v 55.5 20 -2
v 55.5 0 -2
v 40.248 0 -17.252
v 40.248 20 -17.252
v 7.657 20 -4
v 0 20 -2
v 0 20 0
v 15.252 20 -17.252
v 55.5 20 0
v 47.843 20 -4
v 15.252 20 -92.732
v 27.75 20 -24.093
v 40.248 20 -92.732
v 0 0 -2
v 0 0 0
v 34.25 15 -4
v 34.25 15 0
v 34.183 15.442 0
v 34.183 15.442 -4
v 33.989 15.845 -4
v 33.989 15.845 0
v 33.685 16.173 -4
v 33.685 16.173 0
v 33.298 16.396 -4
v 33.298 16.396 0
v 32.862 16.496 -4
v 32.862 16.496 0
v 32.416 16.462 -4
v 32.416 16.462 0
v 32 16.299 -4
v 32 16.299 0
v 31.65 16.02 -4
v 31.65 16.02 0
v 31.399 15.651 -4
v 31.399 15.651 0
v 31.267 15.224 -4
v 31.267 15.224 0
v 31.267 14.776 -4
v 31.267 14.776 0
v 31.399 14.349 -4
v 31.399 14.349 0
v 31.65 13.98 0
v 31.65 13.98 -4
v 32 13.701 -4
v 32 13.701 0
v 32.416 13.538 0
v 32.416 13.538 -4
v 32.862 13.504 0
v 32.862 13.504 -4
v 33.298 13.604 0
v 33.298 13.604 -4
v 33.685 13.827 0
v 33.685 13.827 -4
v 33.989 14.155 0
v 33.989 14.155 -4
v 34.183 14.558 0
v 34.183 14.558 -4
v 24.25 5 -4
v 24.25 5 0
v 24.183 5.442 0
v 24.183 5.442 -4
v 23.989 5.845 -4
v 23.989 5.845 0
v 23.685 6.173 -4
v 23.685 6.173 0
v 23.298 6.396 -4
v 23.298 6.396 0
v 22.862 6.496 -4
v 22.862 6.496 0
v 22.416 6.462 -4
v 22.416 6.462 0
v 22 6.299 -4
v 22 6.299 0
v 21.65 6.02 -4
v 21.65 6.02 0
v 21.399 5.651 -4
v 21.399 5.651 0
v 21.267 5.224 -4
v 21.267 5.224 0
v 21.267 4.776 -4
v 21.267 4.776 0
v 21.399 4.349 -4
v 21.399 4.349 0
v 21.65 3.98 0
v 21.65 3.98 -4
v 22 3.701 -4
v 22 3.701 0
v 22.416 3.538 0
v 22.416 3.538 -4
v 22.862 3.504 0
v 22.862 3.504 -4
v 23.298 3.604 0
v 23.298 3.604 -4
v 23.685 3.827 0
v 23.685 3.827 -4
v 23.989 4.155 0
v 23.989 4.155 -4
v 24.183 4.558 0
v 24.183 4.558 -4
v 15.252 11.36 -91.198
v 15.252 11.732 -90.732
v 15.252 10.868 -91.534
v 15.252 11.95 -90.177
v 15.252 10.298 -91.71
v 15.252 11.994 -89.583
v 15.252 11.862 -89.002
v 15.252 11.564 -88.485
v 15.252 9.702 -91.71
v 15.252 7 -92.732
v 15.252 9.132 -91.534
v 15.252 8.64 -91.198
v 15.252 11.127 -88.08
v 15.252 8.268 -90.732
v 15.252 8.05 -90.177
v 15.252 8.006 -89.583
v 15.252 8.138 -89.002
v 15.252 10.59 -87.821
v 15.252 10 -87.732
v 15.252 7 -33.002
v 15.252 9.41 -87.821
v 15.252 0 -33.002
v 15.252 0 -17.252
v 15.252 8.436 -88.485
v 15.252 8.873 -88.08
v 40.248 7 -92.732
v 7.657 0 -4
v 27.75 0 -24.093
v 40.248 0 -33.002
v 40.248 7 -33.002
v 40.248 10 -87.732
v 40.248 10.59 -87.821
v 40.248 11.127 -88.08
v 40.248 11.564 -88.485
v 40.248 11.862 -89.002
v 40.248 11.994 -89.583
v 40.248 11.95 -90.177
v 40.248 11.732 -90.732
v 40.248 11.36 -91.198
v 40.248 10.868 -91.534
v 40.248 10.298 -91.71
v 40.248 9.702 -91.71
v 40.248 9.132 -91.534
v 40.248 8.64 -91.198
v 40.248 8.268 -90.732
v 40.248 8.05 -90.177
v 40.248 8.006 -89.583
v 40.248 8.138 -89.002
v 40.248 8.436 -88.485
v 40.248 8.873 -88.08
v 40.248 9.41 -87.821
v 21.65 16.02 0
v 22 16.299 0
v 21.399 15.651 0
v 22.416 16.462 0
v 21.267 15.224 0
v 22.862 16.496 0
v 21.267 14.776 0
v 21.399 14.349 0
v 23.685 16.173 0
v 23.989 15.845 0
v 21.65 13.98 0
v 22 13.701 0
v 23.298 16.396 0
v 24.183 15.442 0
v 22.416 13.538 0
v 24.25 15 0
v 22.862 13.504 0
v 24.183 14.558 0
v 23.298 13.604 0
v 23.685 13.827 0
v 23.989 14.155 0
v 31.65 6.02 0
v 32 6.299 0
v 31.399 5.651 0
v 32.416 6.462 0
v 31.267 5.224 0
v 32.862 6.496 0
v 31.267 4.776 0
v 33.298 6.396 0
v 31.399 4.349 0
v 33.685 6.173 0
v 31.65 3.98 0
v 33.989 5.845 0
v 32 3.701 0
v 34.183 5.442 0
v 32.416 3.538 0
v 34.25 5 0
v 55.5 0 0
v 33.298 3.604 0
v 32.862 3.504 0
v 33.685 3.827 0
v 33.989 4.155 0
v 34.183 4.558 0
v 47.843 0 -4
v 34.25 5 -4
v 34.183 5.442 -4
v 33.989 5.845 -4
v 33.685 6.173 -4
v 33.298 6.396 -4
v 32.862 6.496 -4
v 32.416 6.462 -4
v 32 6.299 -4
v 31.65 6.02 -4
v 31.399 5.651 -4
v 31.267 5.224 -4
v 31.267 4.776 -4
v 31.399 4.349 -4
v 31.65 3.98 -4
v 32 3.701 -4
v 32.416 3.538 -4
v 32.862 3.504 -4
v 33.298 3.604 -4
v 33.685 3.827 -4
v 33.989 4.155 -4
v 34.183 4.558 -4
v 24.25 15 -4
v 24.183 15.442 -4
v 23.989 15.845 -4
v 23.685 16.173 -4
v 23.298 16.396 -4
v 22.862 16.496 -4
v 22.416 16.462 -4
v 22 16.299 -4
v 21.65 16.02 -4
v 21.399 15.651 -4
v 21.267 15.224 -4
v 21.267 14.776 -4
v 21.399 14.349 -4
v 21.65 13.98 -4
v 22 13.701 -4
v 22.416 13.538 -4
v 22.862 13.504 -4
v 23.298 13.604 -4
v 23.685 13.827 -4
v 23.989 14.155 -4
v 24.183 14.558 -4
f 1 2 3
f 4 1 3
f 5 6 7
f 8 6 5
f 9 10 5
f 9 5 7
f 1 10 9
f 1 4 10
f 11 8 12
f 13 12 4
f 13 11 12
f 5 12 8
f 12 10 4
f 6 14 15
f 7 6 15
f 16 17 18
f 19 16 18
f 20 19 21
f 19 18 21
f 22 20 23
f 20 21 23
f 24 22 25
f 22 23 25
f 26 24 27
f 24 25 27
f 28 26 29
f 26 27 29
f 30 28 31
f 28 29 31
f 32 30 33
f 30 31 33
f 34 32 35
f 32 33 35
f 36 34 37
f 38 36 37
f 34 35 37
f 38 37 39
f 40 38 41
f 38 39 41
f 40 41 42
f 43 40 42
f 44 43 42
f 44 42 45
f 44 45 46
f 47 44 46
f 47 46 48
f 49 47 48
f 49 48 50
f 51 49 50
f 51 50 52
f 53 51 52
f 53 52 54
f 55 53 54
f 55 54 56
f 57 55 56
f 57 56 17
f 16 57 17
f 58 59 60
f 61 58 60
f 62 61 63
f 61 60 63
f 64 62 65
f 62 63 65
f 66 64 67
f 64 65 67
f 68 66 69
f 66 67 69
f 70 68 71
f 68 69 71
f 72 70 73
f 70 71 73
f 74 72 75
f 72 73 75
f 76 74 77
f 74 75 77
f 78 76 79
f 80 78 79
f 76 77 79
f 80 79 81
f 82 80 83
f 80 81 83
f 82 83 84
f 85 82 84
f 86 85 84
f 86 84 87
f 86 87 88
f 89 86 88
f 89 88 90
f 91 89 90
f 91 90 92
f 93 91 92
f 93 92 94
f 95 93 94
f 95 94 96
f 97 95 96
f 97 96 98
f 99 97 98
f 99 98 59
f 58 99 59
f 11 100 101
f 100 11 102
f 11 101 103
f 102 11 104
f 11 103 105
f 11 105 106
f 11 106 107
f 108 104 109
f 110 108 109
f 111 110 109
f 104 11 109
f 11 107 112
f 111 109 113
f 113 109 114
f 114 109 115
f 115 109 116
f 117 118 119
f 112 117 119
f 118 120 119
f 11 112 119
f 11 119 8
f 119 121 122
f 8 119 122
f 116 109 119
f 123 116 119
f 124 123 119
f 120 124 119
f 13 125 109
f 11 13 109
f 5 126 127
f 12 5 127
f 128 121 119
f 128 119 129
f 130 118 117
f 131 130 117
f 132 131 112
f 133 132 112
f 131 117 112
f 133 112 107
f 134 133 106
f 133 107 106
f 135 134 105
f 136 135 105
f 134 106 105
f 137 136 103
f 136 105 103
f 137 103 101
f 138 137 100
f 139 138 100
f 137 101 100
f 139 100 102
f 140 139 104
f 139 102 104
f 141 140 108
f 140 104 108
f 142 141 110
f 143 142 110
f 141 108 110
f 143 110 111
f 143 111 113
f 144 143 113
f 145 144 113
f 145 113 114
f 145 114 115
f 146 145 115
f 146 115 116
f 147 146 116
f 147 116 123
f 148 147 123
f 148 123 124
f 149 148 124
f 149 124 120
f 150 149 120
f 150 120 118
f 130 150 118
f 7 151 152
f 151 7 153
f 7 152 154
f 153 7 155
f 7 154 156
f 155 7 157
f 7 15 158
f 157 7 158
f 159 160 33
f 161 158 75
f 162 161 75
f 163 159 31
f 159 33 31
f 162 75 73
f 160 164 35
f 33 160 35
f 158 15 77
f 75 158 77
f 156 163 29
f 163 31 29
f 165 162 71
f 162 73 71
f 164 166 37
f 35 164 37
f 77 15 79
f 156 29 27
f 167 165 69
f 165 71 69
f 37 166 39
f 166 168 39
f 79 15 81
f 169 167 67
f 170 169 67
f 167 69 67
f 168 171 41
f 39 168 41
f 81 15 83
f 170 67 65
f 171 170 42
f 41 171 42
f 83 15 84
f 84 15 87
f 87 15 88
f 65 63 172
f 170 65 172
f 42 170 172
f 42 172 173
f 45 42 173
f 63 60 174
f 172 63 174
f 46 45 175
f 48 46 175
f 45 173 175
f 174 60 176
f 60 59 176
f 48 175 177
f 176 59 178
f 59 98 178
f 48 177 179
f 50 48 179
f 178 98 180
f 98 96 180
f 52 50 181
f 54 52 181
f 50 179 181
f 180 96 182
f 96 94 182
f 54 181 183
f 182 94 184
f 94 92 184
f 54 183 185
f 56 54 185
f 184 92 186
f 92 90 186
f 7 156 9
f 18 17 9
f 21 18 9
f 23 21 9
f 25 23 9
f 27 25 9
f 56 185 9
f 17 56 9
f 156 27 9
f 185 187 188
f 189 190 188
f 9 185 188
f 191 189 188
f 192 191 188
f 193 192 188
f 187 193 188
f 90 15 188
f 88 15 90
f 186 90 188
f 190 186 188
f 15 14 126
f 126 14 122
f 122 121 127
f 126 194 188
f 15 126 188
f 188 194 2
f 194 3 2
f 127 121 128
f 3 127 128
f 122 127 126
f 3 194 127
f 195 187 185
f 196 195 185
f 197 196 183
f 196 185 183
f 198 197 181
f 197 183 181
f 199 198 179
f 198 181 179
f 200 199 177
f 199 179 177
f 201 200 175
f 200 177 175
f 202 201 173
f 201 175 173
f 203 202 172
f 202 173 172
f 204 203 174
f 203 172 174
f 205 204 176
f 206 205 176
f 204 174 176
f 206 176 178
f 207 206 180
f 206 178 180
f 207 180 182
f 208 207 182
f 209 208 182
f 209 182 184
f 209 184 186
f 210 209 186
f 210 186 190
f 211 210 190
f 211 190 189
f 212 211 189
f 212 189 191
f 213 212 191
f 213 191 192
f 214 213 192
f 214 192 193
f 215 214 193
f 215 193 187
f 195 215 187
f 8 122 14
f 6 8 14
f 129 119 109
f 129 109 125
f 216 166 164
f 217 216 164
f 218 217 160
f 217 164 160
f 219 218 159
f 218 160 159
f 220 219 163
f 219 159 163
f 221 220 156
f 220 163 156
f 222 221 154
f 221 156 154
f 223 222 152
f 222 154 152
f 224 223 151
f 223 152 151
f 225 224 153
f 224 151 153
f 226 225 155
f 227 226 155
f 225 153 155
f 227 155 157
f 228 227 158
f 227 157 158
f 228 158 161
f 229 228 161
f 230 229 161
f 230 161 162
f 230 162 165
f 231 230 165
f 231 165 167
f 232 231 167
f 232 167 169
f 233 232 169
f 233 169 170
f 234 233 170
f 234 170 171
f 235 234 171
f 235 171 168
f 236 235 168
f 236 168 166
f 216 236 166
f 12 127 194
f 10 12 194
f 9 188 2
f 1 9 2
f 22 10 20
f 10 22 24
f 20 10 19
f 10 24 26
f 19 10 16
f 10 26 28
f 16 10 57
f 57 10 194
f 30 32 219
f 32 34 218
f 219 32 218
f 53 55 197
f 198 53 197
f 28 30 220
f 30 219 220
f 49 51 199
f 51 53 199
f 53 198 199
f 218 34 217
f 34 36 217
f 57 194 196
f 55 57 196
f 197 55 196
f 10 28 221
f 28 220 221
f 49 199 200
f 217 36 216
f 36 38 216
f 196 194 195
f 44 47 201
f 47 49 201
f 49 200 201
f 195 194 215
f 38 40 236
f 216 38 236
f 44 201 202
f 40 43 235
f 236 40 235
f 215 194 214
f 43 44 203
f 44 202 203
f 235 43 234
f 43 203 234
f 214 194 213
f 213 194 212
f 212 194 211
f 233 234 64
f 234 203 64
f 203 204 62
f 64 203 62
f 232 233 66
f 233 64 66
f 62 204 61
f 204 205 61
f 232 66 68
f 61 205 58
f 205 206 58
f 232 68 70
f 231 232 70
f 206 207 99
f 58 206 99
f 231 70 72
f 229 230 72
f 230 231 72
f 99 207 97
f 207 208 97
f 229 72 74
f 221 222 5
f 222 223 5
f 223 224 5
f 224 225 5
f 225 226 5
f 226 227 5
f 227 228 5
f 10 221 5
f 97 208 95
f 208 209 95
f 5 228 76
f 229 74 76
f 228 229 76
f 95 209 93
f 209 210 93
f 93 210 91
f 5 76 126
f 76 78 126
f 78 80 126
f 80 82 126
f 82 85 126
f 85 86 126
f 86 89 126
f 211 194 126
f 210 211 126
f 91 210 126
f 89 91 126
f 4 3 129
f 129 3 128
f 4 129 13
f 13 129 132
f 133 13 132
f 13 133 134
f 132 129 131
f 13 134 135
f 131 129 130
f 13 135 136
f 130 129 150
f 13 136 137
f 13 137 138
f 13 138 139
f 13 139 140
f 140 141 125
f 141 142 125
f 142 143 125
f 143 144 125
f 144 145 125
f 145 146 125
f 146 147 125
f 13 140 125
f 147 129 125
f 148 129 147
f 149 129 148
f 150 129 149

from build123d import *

# Parameters (mm, degrees)
EXTRUDE_1_DEPTH     = 20
SKETCH_2_R          = 1.5
CUT_EXTRUDE_1_DEPTH = 5
SKETCH_4_W          = 24.99770673
SKETCH_4_H          = 59.73
CUT_EXTRUDE_3_DEPTH = 7
SKETCH_8_R          = 2
CUT_EXTRUDE_5_DEPTH = 41.24770673


with BuildPart() as part:
    # 스케치1 → 보스-돌출1 (new body)
    with BuildSketch(Plane(origin=(0, 0, 0), x_dir=(1, 0, 0), z_dir=(0, 1, 0))):
        Polygon((40.24770673, 92.73229327), (15.25229327, 92.73229327), (15.25229327, 17.25229327), (0, 2), (0, 0), (55.5, 0), (55.5, 2), (40.24770673, 17.25229327), align=None)
        Polygon((27.75, 24.093145751), (47.843145751, 4), (7.656854249, 4), align=None, mode=Mode.SUBTRACT)
    extrude(amount=EXTRUDE_1_DEPTH)

    # 스케치2 → 컷-돌출1 (cut)
    with BuildSketch(Plane.XY):
        with Locations((22.75, 15)):
            Circle(SKETCH_2_R)
        with Locations((32.75, 15)):
            Circle(SKETCH_2_R)
        with Locations((32.75, 5)):
            Circle(SKETCH_2_R)
        with Locations((22.75, 5)):
            Circle(SKETCH_2_R)
    extrude(amount=-CUT_EXTRUDE_1_DEPTH, mode=Mode.SUBTRACT)

    # 스케치4 → 컷-돌출3 (cut)
    with BuildSketch(Plane.XZ):
        with Locations((27.748853365, -62.86729327)):
            Rectangle(SKETCH_4_W, SKETCH_4_H)
    extrude(amount=-CUT_EXTRUDE_3_DEPTH, mode=Mode.SUBTRACT)

    # 스케치8 → 컷-돌출5 (cut, through all)
    with BuildSketch(Plane.ZY.offset(-15.25229327)):
        with Locations((-89.73229327, 10)):
            Circle(SKETCH_8_R)
    extrude(amount=-CUT_EXTRUDE_5_DEPTH, mode=Mode.SUBTRACT)


solid = part.part
